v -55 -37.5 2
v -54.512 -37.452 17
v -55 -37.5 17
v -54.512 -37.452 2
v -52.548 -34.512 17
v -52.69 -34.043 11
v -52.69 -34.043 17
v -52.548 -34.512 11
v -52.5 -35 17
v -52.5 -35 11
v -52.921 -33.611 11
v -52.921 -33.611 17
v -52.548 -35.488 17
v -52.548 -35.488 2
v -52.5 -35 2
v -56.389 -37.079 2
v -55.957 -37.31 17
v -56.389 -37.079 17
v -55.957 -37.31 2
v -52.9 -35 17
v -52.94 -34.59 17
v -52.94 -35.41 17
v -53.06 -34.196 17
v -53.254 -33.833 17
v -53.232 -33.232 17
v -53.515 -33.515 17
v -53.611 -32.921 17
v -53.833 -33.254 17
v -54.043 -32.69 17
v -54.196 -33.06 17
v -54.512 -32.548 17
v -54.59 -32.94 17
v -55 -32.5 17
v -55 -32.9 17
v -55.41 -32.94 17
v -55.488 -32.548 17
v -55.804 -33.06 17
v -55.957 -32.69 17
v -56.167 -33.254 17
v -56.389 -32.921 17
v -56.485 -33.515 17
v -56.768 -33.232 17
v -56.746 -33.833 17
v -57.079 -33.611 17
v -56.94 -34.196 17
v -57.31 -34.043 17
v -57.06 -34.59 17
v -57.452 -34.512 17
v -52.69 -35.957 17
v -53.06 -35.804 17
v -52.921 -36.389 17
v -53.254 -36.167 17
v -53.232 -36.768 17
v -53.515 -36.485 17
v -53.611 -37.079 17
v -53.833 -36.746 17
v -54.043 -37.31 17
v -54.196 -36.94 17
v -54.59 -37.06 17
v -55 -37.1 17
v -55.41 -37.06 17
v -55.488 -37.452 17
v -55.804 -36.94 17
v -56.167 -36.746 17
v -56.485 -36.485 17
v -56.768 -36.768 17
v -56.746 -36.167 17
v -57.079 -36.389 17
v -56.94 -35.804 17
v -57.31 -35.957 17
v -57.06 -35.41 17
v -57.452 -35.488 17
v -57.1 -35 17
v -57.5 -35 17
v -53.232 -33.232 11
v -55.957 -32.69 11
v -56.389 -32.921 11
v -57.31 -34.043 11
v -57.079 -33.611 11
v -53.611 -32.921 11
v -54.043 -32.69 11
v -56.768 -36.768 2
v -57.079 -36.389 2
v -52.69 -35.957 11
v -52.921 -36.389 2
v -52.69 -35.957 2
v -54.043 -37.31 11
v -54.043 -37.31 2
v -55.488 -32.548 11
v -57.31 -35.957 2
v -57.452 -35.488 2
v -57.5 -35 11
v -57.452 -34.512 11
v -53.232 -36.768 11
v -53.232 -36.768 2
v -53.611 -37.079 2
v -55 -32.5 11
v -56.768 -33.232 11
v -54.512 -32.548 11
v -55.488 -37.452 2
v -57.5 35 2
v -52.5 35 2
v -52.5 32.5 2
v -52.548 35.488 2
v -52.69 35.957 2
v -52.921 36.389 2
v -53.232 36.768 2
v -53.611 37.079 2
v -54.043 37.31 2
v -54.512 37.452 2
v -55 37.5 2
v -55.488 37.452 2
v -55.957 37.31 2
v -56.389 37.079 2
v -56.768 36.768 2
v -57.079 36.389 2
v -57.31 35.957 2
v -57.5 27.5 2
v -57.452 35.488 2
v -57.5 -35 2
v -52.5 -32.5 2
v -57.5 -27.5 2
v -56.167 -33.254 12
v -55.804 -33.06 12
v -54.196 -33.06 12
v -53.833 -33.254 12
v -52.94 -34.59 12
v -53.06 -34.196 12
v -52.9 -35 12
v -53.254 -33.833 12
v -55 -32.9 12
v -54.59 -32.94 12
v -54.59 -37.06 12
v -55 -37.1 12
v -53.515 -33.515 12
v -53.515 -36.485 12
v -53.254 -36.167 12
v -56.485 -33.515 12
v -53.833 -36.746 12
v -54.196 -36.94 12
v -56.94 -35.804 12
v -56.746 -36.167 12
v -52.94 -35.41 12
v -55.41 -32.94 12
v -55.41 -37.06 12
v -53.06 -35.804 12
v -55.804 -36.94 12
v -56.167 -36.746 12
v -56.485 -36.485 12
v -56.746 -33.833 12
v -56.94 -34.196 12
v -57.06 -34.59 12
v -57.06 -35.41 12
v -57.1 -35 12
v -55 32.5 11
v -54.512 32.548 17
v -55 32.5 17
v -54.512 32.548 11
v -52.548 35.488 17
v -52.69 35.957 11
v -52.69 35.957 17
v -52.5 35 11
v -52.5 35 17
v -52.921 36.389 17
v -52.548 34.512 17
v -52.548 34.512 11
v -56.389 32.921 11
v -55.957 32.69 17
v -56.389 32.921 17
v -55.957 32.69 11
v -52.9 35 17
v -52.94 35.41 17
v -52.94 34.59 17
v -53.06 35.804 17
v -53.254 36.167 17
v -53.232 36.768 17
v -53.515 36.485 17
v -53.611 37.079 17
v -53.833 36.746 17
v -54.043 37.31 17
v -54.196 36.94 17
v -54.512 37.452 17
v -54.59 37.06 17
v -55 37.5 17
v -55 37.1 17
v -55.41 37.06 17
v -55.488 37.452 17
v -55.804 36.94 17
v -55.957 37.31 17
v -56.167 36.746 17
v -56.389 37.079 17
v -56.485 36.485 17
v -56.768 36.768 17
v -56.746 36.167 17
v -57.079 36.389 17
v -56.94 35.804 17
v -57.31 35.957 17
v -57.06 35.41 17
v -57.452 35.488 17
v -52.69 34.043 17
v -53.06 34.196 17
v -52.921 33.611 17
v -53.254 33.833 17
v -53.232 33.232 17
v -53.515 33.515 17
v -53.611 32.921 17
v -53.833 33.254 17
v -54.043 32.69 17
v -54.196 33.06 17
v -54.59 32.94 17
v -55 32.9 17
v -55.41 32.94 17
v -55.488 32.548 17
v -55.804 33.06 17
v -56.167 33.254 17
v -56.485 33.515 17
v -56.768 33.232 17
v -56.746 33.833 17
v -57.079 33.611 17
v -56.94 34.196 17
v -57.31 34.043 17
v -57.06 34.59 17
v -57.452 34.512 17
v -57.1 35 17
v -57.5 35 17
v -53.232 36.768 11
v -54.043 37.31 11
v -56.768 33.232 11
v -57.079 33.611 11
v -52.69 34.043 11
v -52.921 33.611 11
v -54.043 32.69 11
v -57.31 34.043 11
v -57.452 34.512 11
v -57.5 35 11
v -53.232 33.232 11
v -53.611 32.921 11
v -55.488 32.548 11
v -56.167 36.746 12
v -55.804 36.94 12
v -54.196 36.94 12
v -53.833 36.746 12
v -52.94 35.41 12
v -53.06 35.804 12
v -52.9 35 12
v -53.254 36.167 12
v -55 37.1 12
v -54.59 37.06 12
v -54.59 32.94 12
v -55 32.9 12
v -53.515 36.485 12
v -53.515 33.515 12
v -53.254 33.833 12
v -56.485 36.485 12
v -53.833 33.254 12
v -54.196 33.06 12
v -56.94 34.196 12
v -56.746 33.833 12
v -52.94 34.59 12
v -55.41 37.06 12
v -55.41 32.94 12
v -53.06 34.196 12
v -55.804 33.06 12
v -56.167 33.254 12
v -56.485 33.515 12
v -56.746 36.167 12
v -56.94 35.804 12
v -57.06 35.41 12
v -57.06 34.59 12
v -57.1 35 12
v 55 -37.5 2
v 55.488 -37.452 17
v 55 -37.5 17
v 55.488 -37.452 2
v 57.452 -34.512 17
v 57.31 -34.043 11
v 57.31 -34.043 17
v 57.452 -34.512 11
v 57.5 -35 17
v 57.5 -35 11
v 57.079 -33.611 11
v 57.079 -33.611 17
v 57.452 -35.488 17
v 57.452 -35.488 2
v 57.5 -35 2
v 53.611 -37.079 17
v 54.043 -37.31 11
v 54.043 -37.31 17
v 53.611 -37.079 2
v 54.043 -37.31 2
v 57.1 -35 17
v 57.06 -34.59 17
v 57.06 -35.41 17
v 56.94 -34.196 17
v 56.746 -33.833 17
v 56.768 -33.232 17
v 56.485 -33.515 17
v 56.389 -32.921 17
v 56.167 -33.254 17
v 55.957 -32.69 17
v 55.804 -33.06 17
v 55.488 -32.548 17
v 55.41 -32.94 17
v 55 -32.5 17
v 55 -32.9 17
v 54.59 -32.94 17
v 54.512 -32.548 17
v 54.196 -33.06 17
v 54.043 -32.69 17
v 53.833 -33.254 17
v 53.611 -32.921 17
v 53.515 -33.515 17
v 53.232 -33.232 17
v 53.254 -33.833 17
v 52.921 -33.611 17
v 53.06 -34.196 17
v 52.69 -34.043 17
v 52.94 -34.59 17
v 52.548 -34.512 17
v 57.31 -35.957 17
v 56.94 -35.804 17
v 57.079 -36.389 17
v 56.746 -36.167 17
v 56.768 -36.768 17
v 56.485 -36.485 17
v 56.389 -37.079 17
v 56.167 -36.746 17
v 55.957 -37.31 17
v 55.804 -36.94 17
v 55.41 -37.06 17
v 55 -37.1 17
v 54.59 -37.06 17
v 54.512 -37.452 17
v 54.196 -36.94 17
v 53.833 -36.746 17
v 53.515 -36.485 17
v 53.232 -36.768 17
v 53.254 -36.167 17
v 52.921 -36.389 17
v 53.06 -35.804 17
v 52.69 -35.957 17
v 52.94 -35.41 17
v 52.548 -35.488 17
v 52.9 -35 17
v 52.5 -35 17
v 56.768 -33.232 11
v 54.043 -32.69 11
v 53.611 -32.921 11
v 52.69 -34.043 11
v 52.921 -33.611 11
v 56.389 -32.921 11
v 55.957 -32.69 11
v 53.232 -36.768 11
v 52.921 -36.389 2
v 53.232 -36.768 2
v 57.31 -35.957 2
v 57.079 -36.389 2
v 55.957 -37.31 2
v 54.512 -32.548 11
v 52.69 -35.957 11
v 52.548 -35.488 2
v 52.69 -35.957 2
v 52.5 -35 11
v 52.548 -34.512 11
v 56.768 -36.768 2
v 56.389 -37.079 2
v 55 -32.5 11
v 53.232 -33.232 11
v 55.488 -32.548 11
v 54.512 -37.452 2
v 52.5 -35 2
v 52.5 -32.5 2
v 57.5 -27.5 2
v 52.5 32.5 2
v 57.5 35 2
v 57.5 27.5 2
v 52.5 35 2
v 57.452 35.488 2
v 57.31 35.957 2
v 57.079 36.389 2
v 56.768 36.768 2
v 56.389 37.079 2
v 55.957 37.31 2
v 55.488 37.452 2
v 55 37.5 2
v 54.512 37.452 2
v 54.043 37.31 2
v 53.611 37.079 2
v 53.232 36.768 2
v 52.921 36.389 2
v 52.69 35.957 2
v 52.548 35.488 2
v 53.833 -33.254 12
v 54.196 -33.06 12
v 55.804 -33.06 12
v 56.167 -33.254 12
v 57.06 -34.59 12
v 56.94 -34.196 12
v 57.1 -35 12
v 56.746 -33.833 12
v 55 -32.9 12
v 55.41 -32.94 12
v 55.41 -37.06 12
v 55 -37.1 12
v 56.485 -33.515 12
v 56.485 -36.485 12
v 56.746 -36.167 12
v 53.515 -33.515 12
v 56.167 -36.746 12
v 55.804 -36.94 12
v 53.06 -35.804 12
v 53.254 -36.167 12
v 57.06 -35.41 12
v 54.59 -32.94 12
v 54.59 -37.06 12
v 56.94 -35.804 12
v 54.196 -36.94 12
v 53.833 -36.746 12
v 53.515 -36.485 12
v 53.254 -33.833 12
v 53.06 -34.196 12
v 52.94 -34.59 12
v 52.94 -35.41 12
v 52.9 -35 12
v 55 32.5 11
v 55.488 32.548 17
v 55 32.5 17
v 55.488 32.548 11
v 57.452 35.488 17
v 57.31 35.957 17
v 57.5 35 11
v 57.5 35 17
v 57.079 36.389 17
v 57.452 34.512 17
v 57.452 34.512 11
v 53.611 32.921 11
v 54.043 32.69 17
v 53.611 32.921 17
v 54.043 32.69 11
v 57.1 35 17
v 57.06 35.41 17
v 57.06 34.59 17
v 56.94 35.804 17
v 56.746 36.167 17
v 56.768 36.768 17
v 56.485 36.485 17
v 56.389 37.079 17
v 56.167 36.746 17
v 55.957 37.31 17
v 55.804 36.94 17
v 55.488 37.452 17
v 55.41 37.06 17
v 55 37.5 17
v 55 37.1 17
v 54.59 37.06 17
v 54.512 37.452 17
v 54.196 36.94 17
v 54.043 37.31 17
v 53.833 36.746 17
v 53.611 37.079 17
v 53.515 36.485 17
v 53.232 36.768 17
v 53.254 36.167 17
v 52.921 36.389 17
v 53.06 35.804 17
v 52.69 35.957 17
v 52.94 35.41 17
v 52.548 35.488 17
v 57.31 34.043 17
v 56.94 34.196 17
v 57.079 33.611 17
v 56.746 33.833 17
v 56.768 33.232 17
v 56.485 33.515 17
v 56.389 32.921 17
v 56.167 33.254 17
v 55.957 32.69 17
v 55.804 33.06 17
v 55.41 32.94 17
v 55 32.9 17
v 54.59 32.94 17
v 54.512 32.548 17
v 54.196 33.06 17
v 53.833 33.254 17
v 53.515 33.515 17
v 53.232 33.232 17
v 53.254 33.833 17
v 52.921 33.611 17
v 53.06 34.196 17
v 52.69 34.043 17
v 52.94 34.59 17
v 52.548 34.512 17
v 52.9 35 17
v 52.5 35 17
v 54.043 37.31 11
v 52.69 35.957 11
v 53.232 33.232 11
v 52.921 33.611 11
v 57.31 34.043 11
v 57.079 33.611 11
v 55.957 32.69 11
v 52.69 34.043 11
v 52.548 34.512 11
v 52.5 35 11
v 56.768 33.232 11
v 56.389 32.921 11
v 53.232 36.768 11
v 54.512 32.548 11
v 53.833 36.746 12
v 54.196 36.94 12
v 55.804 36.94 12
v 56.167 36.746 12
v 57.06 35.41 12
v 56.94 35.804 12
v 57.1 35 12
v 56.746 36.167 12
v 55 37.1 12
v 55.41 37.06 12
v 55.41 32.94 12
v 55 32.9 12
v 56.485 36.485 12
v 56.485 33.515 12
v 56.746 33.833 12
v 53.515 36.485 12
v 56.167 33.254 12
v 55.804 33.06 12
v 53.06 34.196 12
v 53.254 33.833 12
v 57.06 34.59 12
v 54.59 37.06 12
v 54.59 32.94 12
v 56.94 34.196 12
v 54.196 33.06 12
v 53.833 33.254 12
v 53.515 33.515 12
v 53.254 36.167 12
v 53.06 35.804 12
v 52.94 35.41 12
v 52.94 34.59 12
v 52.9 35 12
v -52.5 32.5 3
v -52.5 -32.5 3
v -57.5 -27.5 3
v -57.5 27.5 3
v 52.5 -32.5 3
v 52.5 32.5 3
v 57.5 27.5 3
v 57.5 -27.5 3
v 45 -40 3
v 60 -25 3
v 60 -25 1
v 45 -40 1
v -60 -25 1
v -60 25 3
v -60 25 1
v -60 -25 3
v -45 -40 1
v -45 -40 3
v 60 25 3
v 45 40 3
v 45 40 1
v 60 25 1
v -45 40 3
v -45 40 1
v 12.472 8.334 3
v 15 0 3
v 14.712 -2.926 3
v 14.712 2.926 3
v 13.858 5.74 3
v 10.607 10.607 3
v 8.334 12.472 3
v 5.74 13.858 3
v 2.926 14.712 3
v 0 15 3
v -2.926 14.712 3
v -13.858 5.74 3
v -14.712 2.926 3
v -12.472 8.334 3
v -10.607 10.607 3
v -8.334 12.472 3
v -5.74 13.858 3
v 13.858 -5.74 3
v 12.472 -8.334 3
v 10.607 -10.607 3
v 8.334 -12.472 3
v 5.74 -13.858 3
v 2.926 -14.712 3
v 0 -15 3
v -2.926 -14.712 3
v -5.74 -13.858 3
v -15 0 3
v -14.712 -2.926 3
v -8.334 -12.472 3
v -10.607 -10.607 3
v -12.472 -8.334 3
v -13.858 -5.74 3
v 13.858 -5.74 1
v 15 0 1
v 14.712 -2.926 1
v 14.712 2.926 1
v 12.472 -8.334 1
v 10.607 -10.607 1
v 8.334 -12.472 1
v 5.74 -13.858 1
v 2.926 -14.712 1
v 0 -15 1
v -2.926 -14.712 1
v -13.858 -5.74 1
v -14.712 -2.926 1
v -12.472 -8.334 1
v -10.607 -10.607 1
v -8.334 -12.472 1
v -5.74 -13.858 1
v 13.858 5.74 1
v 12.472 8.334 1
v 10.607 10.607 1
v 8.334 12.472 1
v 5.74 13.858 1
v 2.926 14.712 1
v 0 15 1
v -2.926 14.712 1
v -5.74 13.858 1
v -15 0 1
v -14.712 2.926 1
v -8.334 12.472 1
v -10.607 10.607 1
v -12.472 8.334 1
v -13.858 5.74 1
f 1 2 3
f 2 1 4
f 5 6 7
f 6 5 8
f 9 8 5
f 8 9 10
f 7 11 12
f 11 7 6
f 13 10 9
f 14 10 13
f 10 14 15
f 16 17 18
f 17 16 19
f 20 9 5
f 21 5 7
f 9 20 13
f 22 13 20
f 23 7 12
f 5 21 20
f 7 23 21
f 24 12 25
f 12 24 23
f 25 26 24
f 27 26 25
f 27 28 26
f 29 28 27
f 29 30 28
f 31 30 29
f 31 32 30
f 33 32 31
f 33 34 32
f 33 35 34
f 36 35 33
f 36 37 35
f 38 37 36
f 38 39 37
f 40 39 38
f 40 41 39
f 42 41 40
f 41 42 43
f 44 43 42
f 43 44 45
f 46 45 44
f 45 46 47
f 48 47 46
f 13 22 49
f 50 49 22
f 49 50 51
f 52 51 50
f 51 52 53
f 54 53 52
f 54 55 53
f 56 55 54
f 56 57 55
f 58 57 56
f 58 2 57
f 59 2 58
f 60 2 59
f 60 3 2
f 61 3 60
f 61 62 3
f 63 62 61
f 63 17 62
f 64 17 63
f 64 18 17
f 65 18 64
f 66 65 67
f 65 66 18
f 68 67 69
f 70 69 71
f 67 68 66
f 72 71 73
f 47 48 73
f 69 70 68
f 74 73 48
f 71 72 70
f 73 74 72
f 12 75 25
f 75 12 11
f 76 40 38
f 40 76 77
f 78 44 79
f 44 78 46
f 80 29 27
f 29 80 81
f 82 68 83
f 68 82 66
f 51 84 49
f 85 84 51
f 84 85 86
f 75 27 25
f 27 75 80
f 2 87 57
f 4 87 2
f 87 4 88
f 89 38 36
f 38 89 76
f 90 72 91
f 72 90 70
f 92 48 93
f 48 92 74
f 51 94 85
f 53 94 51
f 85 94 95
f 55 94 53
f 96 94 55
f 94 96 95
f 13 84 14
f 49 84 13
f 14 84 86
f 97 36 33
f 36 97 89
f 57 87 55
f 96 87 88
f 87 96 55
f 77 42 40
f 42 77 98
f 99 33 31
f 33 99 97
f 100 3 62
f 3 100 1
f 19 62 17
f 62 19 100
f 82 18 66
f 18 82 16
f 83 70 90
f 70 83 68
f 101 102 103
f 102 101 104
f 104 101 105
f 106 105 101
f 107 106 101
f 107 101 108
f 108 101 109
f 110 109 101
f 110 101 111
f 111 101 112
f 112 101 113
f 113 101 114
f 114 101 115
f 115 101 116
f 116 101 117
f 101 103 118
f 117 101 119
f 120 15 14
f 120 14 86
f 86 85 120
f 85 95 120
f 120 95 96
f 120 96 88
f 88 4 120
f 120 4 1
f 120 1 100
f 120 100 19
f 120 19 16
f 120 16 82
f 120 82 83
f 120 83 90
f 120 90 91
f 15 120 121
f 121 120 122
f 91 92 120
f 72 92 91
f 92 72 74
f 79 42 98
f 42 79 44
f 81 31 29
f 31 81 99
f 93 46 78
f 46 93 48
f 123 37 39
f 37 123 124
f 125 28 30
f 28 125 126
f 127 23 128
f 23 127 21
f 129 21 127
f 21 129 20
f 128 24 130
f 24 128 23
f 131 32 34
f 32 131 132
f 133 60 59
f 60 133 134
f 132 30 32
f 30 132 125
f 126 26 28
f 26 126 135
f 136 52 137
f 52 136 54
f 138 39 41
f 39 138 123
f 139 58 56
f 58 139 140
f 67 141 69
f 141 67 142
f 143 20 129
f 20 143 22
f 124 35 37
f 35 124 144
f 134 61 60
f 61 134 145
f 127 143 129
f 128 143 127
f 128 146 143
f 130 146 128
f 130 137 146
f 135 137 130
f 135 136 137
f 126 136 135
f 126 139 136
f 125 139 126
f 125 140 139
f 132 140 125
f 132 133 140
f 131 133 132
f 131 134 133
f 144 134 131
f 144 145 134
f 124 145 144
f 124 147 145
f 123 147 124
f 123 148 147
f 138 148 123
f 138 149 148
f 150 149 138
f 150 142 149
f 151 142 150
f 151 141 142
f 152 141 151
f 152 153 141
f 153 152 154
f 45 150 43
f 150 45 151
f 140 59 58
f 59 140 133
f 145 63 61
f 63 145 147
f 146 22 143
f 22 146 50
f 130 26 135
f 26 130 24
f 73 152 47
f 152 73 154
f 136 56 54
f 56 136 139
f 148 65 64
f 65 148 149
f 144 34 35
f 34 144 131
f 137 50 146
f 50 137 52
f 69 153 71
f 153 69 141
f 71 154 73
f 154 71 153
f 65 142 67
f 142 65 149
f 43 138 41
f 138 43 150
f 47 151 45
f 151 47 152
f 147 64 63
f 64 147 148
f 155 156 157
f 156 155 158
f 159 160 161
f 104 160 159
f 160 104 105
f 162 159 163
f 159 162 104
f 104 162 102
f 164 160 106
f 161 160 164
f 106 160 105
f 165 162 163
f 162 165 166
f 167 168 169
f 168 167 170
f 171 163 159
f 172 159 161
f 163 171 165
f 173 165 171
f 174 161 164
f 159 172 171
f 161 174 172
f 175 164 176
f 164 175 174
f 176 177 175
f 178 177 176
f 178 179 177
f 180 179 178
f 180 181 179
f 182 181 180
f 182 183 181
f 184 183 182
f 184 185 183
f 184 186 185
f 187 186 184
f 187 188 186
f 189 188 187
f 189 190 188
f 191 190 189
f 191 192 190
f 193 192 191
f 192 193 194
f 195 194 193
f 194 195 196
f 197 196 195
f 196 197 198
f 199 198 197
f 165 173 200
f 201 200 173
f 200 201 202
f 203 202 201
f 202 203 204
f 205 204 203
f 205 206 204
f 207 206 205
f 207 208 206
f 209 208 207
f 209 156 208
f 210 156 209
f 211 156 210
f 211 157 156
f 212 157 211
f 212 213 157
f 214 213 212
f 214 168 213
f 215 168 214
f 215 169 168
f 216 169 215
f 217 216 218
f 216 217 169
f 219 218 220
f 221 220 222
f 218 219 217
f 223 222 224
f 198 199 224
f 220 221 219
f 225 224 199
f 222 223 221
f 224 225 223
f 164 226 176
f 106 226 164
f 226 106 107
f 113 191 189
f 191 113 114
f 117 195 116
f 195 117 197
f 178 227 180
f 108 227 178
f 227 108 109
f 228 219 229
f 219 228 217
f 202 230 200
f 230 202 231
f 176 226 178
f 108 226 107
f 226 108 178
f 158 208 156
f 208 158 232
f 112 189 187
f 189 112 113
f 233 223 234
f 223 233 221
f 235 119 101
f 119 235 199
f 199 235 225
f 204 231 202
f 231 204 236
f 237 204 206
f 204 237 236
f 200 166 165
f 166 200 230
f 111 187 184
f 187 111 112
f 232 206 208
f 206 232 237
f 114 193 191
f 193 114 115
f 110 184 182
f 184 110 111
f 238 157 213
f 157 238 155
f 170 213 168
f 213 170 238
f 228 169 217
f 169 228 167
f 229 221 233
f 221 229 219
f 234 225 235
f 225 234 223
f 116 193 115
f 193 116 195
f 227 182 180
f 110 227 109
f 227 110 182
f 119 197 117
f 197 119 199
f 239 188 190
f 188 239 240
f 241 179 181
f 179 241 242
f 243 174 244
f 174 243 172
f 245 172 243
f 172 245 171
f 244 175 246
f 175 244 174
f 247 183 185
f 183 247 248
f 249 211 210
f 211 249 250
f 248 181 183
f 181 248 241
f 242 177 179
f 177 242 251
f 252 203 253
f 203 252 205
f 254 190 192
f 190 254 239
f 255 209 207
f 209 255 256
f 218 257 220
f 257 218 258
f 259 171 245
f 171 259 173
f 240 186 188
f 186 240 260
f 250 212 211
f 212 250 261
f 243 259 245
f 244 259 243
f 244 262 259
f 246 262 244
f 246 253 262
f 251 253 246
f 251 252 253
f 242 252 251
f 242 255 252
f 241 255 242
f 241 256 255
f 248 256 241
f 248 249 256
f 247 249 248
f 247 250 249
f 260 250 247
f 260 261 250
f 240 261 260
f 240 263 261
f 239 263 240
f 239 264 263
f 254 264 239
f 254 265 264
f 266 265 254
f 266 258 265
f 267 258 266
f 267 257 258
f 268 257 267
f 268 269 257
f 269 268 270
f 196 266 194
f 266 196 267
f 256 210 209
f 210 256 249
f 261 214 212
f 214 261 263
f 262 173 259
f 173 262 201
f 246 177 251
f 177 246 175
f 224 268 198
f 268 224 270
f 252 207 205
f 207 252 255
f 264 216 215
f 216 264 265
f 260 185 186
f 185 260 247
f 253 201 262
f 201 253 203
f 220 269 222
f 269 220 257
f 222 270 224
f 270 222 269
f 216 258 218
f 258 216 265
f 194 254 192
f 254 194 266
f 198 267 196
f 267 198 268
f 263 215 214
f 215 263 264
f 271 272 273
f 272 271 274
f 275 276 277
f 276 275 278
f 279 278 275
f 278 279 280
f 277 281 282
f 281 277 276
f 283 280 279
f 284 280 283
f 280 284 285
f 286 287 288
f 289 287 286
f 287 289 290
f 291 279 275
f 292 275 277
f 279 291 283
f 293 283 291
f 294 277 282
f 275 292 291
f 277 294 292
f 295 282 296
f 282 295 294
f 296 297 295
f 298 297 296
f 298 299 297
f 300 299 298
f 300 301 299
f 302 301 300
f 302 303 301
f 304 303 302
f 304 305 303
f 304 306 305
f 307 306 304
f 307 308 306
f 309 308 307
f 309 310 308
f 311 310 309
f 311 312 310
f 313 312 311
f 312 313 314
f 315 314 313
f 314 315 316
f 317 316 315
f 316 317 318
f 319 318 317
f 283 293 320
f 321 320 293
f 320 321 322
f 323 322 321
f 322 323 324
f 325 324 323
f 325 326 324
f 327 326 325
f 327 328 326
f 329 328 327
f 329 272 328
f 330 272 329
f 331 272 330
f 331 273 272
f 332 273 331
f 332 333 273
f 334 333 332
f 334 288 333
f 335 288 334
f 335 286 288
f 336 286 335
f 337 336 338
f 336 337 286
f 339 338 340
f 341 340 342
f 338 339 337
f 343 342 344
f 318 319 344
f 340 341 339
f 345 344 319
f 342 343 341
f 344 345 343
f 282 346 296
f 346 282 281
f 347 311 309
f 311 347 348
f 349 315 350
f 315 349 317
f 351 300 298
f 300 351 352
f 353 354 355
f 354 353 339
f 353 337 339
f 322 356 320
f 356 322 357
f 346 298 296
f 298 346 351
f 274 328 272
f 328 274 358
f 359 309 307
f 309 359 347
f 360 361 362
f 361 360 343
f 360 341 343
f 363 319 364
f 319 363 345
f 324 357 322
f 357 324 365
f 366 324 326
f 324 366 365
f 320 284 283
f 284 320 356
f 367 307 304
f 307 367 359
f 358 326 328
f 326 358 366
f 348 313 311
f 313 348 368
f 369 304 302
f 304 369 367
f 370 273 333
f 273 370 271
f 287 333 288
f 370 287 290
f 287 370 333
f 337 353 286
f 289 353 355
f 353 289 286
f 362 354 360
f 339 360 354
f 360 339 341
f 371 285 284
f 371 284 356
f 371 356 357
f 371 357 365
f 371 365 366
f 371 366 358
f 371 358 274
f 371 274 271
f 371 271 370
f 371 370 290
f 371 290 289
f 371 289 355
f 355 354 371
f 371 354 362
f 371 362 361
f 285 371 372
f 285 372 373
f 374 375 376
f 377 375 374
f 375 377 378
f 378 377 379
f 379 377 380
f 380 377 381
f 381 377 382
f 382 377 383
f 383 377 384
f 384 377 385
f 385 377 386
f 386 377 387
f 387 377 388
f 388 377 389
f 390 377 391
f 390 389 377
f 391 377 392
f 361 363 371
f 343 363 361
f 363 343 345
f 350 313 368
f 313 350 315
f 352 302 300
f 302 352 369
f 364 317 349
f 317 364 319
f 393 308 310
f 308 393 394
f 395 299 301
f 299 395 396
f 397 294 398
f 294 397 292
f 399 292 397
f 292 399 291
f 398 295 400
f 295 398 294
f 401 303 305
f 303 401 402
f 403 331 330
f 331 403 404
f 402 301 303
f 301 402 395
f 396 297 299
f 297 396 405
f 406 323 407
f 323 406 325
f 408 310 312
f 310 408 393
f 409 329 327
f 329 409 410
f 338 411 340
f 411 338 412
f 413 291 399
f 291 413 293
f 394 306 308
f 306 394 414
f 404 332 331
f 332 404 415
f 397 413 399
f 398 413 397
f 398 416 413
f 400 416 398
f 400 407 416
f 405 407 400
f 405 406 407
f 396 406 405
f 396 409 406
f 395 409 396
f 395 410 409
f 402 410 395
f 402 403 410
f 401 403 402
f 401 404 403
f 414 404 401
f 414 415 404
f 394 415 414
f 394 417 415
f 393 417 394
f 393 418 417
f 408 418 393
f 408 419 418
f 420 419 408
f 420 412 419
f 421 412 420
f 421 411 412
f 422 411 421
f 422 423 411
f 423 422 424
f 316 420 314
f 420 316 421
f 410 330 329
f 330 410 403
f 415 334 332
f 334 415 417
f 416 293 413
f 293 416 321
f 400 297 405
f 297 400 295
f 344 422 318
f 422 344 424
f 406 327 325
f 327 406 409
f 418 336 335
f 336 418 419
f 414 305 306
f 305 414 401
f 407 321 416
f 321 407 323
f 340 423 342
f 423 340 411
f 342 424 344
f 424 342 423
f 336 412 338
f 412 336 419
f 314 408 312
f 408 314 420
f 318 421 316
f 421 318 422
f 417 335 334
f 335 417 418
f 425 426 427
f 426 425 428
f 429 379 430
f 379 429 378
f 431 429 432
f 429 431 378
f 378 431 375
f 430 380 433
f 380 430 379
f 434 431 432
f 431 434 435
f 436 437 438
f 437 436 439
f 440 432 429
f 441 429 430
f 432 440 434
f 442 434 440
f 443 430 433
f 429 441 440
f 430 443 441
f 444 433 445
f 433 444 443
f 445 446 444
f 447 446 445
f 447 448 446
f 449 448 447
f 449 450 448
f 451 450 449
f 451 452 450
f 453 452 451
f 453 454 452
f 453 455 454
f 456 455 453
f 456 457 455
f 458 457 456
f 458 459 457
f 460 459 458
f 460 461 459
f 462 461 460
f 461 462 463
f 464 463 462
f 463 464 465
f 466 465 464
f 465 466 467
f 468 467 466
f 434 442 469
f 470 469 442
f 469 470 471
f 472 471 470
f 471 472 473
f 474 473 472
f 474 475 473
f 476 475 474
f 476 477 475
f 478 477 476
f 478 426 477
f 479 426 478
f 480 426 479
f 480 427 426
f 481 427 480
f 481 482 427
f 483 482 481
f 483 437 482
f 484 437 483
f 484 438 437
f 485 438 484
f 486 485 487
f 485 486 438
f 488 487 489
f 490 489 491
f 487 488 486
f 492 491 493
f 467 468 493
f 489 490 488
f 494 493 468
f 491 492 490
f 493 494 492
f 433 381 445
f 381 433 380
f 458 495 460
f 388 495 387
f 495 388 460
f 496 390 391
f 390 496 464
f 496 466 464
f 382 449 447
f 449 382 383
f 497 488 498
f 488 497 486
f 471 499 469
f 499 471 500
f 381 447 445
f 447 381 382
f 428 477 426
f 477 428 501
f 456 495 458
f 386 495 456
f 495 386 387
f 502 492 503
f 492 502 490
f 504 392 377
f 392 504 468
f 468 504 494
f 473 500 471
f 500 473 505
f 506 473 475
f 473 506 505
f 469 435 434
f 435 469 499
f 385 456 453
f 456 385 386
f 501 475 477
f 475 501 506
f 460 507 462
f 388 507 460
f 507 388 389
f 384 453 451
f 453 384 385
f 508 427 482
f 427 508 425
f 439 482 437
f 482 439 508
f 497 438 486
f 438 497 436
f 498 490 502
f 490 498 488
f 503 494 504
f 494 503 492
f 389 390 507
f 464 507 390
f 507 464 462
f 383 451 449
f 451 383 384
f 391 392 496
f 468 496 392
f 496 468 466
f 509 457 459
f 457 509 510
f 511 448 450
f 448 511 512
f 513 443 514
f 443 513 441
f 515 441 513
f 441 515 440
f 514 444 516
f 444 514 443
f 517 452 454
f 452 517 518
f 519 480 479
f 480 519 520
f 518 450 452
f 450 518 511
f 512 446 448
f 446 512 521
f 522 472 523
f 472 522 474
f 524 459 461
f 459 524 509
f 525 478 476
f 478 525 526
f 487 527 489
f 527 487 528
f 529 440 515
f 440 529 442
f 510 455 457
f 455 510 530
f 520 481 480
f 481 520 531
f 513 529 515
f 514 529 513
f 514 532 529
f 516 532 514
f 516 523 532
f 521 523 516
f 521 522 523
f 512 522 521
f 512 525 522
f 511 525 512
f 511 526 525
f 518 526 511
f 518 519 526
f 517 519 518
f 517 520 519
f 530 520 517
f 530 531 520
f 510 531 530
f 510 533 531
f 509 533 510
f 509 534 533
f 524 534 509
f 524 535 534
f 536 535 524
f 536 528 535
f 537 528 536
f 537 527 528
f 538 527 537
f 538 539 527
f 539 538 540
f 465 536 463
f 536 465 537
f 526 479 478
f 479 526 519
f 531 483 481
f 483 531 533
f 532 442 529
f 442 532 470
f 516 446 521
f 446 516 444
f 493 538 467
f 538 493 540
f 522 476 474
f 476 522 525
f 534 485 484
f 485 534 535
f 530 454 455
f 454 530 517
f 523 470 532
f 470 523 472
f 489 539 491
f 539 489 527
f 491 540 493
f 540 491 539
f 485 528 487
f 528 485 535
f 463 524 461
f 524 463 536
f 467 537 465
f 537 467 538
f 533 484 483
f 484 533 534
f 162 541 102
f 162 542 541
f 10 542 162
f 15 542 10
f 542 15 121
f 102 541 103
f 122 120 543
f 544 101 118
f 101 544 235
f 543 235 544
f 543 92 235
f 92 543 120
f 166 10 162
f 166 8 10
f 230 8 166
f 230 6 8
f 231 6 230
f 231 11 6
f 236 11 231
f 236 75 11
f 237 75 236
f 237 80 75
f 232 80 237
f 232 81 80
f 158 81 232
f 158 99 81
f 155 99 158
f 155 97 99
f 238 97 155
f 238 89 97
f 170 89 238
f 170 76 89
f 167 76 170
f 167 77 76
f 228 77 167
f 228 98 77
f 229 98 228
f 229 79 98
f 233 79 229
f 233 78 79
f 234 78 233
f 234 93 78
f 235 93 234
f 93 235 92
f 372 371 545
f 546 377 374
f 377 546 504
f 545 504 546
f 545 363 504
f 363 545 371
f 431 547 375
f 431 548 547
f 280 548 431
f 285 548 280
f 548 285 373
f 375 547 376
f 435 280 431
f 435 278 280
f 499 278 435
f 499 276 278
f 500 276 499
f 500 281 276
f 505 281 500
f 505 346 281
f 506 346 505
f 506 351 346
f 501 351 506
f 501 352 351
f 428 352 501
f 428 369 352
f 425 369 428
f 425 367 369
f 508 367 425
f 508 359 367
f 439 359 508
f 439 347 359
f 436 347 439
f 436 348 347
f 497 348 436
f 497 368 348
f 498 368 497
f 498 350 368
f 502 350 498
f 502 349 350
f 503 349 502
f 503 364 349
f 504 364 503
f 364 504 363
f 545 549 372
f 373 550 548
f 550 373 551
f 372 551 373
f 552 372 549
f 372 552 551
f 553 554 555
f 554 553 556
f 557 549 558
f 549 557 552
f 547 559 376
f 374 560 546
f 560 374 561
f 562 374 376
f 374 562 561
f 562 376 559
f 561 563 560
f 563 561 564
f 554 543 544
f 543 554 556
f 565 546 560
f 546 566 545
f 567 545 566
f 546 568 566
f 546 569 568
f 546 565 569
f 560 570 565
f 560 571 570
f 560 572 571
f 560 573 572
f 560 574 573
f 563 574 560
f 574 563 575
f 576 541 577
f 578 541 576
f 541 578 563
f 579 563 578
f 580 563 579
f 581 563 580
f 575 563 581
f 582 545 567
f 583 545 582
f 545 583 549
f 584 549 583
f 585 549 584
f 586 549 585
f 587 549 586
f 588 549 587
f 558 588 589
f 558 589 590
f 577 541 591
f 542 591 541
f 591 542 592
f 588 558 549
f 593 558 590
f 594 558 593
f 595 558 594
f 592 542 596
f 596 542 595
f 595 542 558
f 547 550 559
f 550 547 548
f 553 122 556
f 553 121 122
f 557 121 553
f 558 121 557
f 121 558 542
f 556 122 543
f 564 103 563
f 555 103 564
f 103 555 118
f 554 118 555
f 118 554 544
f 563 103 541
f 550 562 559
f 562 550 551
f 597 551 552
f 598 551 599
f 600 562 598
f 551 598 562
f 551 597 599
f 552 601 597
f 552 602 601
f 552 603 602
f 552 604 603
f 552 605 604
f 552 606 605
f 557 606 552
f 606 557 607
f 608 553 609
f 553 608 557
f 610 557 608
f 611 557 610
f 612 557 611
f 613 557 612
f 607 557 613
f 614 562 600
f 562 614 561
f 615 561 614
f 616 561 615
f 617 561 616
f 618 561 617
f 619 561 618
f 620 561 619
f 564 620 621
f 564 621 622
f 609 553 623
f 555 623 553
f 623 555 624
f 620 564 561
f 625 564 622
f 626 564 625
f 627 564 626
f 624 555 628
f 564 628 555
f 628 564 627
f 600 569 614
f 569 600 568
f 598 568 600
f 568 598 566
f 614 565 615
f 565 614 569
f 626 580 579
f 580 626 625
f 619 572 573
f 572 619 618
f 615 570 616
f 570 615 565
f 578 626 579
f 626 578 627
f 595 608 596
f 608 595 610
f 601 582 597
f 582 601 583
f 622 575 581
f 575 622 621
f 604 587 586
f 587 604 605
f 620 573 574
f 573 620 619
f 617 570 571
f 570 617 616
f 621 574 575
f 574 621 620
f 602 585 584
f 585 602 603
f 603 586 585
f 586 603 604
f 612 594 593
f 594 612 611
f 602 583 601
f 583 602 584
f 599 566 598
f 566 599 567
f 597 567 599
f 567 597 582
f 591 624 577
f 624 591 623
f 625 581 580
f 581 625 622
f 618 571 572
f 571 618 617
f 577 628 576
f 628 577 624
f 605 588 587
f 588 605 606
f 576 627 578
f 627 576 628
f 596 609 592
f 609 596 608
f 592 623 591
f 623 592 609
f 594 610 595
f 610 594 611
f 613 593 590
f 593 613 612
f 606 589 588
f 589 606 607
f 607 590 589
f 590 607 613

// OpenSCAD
// ==========================================
// Xentient Interior — Zone B Plate (Master Solder Board)
// Mounts 120×80mm board at Z=20
// CANNOT be replaced by glued standoffs — needs flat plate
// ==========================================
// Print count: 1
// Mount: slides into rail guide channels at Z=20, or rests on glued standoffs
// Per Framework §7: board mount + cross-bracing + wire chimney
// Units: mm

$fn = 32;

Board_L    = 120.0;
Board_W    = 80.0;
Board_SoX  = 110.0;    // Standoff span X
Board_SoY  = 70.0;     // Standoff span Y
Board_Chamfer = 15.0;   // Corner chamfer for hex fit

M3_Insert  = 4.2;      // Heat-set insert hole
M3_Boss    = 5.0;
Plate_T    = 2.0;
Wire_Chimney_D = 30.0;
Slot_W     = 3.5;
Slot_Engage = 2.0;

module zone_b_plate() {
    difference() {
        union() {
            // Main plate with chamfered corners (fits hex at Z=20, F2F≈133mm)
            translate([0, 0, Plate_T/2])
                hull() {
                    for (sx = [-1, 1], sy = [-1, 1]) {
                        translate([sx * (Board_L/2 - Board_Chamfer),
                                   sy * (Board_W/2 - Board_Chamfer), 0])
                            cylinder(h=Plate_T, r=Board_Chamfer, $fn=4);
                    }
                }

            // 4× M3 standoff pillars
            for (sx = [-1, 1], sy = [-1, 1]) {
                translate([sx * Board_SoX/2, sy * Board_SoY/2, Plate_T])
                    difference() {
                        cylinder(h=15, d=M3_Boss, $fn=32);
                        translate([0, 0, 10])
                            cylinder(h=6, d=M3_Insert, $fn=32);
                    }
            }

            // Cross-bracing
            for (sx = [-1, 1]) {
                hull() {
                    translate([sx * Board_SoX/2, -Board_SoY/2, Plate_T])
                        cylinder(h=9, d=M3_Boss, $fn=16);
                    translate([sx * Board_SoX/2, Board_SoY/2, Plate_T])
                        cylinder(h=9, d=M3_Boss, $fn=16);
                }
            }
        }

        // Wire chimney
        translate([0, 0, -1])
            cylinder(h=40, d=Wire_Chimney_D, $fn=32);

        // Rail engagement notches
        for (sx = [-1, 1], sy = [-1, 1]) {
            translate([sx * 63, sy * 33, Plate_T])
                cube([Slot_W, 3.0, Slot_Engage + 1], center=true);
        }
    }
}

// Render
zone_b_plate();
